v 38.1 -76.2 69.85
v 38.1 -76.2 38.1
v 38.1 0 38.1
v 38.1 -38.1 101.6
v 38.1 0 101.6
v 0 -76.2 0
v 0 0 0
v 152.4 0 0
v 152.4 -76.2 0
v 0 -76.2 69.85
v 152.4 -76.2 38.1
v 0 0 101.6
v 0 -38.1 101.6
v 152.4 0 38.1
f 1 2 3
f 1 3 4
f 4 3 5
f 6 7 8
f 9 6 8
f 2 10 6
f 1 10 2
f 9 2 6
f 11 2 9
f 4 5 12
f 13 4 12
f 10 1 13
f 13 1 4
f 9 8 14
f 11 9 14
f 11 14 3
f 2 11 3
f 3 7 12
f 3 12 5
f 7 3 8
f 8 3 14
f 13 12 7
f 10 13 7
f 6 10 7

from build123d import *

# Parameters (mm, degrees)
F1_DEPTH = 76.2
F3_DEPTH = 38.101


with BuildPart() as f1:
    # F0 (on Front) → F1 (new body)
    with BuildSketch(Plane.XZ):
        Polygon((0, 101.6), (0, 0), (152.4, 0), (152.4, 38.1), (38.1, 38.1), (38.1, 101.6), align=None)
    extrude(amount=F1_DEPTH)

    # F2 (on face) → F3 (cut, through all)
    with BuildSketch(Plane.YZ.offset(38.1)):
        Polygon((-76.2, 69.85), (-38.1, 101.6), (-76.2, 101.6), align=None)
    extrude(amount=-F3_DEPTH, mode=Mode.SUBTRACT)


solid = f1.part
